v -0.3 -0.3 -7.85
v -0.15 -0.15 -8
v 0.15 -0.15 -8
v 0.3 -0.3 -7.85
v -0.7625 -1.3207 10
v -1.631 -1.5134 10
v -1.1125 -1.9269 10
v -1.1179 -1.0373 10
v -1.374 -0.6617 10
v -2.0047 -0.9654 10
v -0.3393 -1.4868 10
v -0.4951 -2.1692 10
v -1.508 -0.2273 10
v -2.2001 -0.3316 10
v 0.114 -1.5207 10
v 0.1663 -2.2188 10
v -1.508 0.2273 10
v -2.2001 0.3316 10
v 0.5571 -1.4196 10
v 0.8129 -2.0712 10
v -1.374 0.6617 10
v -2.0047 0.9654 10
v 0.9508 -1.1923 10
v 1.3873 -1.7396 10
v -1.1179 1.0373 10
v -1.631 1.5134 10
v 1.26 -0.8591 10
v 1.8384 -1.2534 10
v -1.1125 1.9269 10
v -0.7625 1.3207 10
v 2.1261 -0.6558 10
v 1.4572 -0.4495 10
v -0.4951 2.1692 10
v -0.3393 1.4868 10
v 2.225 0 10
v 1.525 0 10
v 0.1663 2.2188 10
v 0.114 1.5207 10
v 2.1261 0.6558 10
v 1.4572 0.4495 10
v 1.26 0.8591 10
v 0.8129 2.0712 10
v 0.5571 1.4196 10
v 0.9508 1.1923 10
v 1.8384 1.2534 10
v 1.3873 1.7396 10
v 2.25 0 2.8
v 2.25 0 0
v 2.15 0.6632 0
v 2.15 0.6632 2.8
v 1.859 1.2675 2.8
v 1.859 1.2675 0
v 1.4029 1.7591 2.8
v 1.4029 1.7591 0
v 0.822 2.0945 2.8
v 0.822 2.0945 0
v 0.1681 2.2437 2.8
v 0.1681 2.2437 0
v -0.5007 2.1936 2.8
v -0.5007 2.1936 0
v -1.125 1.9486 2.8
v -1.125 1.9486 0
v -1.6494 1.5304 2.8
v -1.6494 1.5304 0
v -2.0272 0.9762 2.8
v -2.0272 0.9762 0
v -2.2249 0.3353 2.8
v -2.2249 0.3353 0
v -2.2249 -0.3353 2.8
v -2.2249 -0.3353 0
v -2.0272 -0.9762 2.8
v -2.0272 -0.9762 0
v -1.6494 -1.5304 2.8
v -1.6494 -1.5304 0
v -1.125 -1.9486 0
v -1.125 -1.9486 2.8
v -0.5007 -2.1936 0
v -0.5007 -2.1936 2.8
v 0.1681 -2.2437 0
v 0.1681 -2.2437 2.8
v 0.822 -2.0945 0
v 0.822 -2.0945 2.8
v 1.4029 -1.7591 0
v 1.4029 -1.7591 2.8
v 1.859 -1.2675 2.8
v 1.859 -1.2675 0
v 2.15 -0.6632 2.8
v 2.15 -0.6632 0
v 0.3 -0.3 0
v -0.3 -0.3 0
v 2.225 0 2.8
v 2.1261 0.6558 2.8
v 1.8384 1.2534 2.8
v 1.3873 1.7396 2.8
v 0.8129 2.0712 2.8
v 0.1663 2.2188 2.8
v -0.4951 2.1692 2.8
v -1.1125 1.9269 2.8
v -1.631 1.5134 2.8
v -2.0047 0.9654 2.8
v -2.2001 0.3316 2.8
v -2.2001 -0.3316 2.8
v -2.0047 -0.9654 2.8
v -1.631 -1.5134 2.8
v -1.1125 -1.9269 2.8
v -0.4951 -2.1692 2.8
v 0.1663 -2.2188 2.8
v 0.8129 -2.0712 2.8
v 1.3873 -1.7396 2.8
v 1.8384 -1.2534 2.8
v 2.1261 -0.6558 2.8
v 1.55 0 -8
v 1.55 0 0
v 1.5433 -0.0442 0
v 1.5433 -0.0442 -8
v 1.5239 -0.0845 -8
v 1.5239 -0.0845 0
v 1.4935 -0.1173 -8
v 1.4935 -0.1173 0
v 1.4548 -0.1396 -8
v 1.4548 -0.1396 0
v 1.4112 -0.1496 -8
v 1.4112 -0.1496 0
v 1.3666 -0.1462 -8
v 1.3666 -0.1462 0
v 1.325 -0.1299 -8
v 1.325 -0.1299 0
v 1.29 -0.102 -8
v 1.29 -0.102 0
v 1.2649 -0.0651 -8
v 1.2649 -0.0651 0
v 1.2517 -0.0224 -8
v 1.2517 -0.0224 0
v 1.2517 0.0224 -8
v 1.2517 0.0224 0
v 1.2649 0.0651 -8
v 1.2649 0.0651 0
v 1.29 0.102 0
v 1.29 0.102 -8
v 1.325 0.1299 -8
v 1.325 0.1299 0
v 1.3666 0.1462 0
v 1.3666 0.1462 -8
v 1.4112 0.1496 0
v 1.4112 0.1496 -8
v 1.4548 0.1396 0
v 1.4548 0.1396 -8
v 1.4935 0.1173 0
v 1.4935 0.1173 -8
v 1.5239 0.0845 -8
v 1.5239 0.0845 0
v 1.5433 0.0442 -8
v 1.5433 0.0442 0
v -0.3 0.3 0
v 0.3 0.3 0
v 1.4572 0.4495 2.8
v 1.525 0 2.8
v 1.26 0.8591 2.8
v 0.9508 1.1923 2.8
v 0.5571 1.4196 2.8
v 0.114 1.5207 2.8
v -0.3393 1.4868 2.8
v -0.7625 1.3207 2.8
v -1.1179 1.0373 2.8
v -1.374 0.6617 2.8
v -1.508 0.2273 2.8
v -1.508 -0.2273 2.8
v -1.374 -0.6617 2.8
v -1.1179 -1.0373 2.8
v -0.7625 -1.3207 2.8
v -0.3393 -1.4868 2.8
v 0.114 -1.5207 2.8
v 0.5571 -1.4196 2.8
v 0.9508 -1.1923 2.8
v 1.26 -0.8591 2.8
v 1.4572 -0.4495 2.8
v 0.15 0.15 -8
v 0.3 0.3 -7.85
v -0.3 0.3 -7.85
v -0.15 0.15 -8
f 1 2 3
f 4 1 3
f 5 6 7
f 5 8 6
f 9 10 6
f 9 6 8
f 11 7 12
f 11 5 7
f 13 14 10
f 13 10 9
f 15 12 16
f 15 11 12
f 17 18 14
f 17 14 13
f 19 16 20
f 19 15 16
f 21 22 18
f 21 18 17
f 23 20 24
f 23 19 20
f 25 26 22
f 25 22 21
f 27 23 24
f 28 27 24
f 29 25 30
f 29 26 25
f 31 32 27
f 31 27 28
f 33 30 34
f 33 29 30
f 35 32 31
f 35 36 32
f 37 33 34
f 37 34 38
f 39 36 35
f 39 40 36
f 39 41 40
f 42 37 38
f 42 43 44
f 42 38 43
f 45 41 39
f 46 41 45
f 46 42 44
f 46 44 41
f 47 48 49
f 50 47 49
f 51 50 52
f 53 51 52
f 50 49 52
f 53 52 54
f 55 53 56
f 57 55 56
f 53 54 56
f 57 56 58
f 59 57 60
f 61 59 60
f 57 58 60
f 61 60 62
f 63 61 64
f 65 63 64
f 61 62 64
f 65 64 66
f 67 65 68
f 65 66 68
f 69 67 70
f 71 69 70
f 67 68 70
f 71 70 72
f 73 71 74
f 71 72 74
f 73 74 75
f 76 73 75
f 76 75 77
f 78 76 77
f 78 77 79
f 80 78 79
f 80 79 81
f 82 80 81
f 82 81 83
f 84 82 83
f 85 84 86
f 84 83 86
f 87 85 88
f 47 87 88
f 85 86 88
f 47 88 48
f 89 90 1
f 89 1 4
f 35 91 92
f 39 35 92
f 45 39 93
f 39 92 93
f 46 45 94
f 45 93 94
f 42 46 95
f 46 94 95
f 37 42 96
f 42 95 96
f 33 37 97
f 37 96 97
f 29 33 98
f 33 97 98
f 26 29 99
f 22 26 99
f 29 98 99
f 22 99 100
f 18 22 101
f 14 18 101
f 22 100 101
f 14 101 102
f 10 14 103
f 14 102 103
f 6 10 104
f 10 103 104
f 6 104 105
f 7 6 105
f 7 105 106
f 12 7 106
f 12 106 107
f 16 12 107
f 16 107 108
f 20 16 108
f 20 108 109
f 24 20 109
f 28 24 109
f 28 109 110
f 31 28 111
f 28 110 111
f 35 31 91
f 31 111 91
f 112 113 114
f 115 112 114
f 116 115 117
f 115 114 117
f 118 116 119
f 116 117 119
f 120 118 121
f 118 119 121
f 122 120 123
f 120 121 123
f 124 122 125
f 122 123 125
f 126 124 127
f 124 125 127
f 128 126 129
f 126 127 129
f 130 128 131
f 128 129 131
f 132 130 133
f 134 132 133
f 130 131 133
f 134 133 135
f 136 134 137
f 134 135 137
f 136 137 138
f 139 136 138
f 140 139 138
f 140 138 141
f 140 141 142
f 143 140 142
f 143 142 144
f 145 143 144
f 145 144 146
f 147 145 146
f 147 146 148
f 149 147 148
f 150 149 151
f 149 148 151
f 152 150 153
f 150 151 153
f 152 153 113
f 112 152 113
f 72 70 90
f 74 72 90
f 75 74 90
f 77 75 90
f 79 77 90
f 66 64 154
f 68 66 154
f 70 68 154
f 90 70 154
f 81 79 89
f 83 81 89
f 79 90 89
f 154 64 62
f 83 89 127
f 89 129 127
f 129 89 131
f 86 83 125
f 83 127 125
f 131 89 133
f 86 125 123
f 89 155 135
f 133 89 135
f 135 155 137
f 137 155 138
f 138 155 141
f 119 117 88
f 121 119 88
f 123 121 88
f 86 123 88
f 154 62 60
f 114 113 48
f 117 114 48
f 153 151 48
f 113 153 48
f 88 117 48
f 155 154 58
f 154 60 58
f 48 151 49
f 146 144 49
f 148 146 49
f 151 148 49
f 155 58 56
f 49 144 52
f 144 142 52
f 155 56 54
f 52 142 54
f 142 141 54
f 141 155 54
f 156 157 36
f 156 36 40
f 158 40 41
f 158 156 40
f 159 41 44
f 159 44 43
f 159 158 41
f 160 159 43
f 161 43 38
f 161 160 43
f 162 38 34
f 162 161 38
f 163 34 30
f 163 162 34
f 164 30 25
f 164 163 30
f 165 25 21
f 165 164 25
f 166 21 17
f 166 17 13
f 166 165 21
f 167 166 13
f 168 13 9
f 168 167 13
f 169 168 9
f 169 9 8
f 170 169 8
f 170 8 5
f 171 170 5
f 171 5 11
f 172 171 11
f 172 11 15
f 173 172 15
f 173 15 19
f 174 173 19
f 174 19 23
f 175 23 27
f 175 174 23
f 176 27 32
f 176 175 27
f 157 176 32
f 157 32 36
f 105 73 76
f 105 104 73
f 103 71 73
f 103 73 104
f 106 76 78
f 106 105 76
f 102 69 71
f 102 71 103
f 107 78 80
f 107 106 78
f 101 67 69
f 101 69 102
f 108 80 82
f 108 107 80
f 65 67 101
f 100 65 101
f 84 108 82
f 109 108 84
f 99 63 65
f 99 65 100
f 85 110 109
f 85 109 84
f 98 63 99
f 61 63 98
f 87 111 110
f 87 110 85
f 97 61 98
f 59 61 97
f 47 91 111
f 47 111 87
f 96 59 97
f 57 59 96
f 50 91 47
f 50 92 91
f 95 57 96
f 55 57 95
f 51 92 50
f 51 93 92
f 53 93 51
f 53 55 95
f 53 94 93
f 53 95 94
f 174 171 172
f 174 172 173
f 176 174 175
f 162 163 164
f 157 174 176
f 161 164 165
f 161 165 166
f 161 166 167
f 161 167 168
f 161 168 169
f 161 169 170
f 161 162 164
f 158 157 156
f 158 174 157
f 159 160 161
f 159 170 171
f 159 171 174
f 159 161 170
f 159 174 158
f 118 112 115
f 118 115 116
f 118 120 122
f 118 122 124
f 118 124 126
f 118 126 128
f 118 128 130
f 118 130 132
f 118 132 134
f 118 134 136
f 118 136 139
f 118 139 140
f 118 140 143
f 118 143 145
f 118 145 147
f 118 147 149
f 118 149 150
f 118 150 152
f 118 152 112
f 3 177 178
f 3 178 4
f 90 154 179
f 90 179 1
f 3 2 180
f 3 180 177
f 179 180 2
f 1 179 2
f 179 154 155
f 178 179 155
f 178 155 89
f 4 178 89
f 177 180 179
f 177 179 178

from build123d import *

# Parameters (mm, degrees)
SKETCH_R      = 2.25
PAD_DEPTH     = 2.8
SKETCH002_W   = 0.6
SKETCH002_H   = 0.6
PAD002_DEPTH  = 8
CHAMFER_SIZE  = 0.15
SKETCH003_R   = 0.15
PAD003_DEPTH  = 8
SKETCH004_R   = 2.225
SKETCH004_R_2 = 1.525
PAD004_DEPTH  = 7.2


with BuildPart() as part:
    # Sketch → Pad (new body)
    with BuildSketch(Plane.XY):
        Circle(SKETCH_R)
    extrude(amount=PAD_DEPTH)

    # Sketch002 → Pad002 (join)
    with BuildSketch(Plane(origin=(0, 0, 0), x_dir=(1, 0, 0), z_dir=(0, 0, -1))):
        Rectangle(SKETCH002_W, SKETCH002_H)
    extrude(amount=PAD002_DEPTH)

    # Chamfer
    chamfer_edges = [part.edges().sort_by_distance(p)[0] for p in [
        (0, -0.3, -8),
        (0.3, 0, -8),
        (0, 0.3, -8),
        (-0.3, 0, -8),
    ]]
    chamfer(chamfer_edges, length=CHAMFER_SIZE)

    # Sketch003 (on Face4 of Chamfer) → Pad003 (join)
    with BuildSketch(Plane(origin=(0, 0, 0), x_dir=(1, 0, 0), z_dir=(0, 0, -1))):
        with Locations((1.4, 0)):
            Circle(SKETCH003_R)
    extrude(amount=PAD003_DEPTH)

    # Sketch004 (on Face13 of Pad003) → Pad004 (join)
    with BuildSketch(Plane.XY.offset(2.8)):
        Circle(SKETCH004_R)
        Circle(SKETCH004_R_2, mode=Mode.SUBTRACT)
    extrude(amount=PAD004_DEPTH)


solid = part.part
